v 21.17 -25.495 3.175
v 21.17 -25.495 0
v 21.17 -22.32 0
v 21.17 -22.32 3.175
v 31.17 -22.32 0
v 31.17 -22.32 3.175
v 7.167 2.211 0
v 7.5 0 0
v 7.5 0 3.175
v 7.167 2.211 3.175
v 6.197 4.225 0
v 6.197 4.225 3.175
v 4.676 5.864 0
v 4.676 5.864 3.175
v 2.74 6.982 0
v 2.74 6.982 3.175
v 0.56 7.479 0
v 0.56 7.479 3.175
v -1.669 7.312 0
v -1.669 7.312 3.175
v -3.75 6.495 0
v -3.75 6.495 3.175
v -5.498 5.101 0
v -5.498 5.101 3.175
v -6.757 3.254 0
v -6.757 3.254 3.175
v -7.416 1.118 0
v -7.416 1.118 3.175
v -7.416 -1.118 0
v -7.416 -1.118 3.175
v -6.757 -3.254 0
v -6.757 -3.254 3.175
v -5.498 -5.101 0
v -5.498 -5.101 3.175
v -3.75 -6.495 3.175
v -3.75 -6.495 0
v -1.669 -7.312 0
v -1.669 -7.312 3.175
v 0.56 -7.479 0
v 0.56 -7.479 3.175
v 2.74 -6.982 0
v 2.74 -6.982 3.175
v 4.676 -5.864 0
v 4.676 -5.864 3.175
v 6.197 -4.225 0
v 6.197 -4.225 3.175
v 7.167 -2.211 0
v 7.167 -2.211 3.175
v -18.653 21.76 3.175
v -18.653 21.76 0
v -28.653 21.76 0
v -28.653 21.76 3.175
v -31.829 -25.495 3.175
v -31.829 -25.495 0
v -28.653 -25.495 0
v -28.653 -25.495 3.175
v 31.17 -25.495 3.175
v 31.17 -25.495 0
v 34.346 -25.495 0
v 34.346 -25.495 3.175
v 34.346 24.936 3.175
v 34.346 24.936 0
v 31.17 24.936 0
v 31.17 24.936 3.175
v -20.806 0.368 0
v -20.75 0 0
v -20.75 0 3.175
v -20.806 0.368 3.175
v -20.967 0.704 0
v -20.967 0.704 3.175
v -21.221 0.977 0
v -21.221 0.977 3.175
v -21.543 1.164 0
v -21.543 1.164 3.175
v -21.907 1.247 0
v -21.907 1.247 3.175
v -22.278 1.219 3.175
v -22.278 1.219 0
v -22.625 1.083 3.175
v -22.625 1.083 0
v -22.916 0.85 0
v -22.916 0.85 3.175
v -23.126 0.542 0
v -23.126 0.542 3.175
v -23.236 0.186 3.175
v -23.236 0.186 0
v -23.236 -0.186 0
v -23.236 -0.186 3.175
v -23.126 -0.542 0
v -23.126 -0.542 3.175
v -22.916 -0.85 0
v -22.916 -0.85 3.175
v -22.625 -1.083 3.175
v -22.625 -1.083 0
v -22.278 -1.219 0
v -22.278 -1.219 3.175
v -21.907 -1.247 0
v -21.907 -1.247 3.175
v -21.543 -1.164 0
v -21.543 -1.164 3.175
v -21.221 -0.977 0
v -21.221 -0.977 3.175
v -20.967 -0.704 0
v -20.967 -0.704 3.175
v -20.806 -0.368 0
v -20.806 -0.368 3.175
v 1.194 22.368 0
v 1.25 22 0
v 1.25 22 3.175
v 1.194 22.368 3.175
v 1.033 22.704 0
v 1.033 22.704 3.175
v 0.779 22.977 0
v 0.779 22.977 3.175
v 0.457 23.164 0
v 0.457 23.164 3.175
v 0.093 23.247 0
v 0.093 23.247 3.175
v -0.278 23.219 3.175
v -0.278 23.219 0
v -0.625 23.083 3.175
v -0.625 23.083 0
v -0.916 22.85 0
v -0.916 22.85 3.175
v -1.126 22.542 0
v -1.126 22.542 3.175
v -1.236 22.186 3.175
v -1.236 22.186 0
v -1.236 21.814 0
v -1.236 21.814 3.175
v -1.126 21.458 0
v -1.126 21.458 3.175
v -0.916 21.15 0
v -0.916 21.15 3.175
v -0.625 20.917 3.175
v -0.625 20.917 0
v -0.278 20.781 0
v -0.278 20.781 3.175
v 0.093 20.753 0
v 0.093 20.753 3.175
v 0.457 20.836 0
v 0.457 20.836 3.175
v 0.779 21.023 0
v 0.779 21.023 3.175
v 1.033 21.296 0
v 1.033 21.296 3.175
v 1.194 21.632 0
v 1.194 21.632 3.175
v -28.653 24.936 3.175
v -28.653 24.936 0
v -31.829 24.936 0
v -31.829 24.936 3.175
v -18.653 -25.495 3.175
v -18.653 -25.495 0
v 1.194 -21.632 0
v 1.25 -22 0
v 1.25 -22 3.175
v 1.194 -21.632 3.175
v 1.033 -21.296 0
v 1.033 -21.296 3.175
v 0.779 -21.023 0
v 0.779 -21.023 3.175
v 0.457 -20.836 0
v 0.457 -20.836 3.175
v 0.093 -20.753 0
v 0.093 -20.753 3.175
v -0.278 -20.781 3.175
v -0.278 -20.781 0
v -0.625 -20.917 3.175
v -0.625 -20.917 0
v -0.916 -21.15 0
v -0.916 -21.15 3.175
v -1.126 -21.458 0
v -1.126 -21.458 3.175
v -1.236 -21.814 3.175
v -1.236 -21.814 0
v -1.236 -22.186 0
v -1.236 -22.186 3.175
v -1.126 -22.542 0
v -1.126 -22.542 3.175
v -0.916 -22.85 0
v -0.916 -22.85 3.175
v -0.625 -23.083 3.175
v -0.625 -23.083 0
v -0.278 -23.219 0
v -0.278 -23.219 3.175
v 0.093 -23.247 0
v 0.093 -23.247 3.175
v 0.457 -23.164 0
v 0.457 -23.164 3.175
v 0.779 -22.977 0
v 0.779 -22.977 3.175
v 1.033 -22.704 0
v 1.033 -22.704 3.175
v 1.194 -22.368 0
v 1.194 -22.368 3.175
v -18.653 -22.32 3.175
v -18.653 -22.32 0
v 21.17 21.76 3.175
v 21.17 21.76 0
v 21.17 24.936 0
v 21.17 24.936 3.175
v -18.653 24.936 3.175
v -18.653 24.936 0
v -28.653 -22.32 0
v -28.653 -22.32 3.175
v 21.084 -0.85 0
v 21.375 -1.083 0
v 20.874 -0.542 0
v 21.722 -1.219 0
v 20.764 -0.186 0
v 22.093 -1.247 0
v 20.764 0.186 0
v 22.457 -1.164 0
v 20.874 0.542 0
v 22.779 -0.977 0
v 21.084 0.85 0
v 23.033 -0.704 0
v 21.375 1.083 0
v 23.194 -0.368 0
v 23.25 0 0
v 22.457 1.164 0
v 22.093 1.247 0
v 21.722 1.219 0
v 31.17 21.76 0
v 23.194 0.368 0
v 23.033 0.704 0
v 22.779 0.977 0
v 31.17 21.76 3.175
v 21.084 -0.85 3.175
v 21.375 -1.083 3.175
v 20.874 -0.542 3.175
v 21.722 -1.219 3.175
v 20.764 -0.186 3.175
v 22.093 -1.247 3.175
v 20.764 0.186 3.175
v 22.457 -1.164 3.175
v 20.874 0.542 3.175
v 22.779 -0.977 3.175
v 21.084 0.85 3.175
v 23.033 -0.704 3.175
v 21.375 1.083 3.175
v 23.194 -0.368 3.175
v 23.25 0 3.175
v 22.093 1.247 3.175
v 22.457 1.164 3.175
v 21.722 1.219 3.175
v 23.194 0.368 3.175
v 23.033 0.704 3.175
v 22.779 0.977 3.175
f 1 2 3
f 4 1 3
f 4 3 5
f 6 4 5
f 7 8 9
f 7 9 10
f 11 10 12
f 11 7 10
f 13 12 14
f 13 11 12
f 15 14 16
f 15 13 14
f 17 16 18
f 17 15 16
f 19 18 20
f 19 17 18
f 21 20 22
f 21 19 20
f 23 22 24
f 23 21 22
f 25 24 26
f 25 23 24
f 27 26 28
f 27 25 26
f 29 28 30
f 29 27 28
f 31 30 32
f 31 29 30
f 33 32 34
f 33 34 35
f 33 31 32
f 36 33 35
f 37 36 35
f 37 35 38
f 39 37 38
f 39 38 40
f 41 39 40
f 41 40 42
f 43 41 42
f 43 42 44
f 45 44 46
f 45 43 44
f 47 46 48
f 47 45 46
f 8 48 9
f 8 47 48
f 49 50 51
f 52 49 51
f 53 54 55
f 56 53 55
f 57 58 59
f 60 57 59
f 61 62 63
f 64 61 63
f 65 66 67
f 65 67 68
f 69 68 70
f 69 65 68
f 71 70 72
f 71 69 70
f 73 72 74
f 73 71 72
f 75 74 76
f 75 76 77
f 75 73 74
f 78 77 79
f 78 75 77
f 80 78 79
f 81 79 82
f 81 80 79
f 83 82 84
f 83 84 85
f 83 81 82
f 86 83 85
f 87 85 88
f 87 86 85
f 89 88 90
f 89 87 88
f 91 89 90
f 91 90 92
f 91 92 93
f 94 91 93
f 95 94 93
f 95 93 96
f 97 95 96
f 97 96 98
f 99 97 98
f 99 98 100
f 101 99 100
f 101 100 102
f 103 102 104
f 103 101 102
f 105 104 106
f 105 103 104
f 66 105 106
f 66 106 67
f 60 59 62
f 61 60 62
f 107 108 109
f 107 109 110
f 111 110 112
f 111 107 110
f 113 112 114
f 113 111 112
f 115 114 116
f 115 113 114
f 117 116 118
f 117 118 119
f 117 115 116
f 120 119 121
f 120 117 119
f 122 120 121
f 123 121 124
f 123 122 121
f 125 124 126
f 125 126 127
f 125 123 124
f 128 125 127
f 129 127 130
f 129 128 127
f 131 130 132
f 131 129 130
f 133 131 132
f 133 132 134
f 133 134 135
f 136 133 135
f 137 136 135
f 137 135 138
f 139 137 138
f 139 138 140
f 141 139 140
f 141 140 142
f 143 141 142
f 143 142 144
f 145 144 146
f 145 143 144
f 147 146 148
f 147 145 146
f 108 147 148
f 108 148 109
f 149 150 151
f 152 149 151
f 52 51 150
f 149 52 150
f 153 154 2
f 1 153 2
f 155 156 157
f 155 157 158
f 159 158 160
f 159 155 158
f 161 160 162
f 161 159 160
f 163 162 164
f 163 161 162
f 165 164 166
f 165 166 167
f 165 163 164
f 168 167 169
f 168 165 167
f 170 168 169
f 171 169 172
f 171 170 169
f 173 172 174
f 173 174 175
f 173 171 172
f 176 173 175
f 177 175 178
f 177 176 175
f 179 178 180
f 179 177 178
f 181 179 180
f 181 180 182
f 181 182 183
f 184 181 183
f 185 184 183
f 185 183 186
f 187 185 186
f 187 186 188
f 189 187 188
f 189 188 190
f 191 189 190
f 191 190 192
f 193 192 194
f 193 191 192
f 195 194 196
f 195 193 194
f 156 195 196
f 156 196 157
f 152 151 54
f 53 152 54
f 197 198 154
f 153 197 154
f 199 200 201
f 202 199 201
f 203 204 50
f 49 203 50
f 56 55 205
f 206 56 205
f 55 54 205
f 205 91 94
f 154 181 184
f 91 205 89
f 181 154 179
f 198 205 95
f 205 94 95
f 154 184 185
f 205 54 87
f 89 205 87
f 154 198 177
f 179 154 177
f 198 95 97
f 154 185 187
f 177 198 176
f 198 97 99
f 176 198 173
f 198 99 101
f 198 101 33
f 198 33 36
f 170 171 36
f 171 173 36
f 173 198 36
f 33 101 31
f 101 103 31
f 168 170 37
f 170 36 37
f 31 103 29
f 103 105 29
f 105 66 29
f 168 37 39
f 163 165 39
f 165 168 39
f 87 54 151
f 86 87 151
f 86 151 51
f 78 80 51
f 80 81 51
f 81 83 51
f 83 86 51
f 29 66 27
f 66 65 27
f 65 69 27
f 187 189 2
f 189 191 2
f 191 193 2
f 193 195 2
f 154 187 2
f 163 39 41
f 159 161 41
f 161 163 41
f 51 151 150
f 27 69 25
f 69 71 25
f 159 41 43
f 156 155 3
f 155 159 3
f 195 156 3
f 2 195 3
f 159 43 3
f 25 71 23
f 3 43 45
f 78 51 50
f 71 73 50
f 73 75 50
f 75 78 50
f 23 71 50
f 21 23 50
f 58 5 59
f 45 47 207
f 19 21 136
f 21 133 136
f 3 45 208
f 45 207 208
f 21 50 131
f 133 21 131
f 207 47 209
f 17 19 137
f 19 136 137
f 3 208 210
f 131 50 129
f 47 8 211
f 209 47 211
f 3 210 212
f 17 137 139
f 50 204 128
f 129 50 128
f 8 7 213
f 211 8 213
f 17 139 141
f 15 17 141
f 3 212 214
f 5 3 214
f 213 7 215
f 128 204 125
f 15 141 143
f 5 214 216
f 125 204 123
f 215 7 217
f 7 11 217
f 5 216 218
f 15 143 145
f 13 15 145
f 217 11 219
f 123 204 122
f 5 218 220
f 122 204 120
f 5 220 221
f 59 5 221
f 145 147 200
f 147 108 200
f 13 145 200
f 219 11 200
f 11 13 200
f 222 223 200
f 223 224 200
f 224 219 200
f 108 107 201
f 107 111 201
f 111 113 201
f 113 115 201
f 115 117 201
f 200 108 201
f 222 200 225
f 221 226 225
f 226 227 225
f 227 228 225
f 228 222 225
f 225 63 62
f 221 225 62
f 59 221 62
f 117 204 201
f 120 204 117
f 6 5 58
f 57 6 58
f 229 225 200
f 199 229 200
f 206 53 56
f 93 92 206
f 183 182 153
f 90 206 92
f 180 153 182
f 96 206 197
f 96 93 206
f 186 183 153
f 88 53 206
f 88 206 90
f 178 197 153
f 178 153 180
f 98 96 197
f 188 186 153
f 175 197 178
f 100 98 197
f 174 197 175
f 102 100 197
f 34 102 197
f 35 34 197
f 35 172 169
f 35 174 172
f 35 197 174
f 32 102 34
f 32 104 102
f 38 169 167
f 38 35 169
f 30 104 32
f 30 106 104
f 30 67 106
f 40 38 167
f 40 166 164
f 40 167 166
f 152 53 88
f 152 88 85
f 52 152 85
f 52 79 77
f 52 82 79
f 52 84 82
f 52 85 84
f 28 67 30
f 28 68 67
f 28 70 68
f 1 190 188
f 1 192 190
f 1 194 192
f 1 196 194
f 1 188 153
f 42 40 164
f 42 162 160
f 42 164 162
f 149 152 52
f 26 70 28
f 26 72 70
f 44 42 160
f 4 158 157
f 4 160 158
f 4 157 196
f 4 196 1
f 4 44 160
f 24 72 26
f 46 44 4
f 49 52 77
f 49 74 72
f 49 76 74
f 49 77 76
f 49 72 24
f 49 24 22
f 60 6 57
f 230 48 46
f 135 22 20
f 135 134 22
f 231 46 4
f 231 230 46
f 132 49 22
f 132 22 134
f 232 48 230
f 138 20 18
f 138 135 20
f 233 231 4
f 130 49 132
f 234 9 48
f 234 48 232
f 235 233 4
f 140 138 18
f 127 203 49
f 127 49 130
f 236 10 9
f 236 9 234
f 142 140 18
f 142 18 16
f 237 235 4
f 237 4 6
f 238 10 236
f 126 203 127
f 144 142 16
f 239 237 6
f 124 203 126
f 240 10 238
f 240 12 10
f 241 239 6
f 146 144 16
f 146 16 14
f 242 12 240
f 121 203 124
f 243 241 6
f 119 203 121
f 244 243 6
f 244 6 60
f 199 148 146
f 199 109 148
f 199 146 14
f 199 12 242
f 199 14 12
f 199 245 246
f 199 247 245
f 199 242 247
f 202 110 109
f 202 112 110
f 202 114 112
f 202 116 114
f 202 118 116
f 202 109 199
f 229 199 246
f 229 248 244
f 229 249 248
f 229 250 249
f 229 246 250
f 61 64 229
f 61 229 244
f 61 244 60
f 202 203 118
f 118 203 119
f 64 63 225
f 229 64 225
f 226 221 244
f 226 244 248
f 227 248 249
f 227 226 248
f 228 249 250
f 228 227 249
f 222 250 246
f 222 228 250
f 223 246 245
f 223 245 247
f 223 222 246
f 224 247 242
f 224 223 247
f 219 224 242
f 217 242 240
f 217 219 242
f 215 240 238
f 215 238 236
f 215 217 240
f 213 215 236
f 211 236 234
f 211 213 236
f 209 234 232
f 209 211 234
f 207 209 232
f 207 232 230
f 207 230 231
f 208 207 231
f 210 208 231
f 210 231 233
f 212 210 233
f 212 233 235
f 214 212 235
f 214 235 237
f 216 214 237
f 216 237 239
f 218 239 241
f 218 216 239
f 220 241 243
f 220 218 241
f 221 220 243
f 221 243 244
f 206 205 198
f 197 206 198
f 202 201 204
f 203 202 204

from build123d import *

# Parameters (mm, degrees)
F0_R     = 1.25
F0_R_2   = 7.5
F1_DEPTH = 3.175


with BuildPart() as f1:
    # F0 (on Top) → F1 (new body)
    with BuildSketch(Plane.XY):
        Polygon((-28.653005, 24.935823), (-31.82862, 24.935823), (-31.82862, -25.495171), (-28.653005, -25.495171), (-28.653005, -22.319556), (-18.653005, -22.319556), (-18.653005, -25.495171), (21.170266, -25.495171), (21.170266, -22.319556), (31.170266, -22.319556), (31.170266, -25.495171), (34.34638, -25.495171), (34.34638, 24.935823), (31.170266, 24.935823), (31.170266, 21.760208), (21.170266, 21.760208), (21.170266, 24.935823), (-18.653005, 24.935823), (-18.653005, 21.760208), (-28.653005, 21.760208), align=None)
        with Locations((0, -22)):
            Circle(F0_R, mode=Mode.SUBTRACT)
        with Locations((-22, 0)):
            Circle(F0_R, mode=Mode.SUBTRACT)
        Circle(F0_R_2, mode=Mode.SUBTRACT)
        with Locations((0, 22)):
            Circle(F0_R, mode=Mode.SUBTRACT)
        with Locations((22, 0)):
            Circle(F0_R, mode=Mode.SUBTRACT)
    extrude(amount=F1_DEPTH)


solid = f1.part
